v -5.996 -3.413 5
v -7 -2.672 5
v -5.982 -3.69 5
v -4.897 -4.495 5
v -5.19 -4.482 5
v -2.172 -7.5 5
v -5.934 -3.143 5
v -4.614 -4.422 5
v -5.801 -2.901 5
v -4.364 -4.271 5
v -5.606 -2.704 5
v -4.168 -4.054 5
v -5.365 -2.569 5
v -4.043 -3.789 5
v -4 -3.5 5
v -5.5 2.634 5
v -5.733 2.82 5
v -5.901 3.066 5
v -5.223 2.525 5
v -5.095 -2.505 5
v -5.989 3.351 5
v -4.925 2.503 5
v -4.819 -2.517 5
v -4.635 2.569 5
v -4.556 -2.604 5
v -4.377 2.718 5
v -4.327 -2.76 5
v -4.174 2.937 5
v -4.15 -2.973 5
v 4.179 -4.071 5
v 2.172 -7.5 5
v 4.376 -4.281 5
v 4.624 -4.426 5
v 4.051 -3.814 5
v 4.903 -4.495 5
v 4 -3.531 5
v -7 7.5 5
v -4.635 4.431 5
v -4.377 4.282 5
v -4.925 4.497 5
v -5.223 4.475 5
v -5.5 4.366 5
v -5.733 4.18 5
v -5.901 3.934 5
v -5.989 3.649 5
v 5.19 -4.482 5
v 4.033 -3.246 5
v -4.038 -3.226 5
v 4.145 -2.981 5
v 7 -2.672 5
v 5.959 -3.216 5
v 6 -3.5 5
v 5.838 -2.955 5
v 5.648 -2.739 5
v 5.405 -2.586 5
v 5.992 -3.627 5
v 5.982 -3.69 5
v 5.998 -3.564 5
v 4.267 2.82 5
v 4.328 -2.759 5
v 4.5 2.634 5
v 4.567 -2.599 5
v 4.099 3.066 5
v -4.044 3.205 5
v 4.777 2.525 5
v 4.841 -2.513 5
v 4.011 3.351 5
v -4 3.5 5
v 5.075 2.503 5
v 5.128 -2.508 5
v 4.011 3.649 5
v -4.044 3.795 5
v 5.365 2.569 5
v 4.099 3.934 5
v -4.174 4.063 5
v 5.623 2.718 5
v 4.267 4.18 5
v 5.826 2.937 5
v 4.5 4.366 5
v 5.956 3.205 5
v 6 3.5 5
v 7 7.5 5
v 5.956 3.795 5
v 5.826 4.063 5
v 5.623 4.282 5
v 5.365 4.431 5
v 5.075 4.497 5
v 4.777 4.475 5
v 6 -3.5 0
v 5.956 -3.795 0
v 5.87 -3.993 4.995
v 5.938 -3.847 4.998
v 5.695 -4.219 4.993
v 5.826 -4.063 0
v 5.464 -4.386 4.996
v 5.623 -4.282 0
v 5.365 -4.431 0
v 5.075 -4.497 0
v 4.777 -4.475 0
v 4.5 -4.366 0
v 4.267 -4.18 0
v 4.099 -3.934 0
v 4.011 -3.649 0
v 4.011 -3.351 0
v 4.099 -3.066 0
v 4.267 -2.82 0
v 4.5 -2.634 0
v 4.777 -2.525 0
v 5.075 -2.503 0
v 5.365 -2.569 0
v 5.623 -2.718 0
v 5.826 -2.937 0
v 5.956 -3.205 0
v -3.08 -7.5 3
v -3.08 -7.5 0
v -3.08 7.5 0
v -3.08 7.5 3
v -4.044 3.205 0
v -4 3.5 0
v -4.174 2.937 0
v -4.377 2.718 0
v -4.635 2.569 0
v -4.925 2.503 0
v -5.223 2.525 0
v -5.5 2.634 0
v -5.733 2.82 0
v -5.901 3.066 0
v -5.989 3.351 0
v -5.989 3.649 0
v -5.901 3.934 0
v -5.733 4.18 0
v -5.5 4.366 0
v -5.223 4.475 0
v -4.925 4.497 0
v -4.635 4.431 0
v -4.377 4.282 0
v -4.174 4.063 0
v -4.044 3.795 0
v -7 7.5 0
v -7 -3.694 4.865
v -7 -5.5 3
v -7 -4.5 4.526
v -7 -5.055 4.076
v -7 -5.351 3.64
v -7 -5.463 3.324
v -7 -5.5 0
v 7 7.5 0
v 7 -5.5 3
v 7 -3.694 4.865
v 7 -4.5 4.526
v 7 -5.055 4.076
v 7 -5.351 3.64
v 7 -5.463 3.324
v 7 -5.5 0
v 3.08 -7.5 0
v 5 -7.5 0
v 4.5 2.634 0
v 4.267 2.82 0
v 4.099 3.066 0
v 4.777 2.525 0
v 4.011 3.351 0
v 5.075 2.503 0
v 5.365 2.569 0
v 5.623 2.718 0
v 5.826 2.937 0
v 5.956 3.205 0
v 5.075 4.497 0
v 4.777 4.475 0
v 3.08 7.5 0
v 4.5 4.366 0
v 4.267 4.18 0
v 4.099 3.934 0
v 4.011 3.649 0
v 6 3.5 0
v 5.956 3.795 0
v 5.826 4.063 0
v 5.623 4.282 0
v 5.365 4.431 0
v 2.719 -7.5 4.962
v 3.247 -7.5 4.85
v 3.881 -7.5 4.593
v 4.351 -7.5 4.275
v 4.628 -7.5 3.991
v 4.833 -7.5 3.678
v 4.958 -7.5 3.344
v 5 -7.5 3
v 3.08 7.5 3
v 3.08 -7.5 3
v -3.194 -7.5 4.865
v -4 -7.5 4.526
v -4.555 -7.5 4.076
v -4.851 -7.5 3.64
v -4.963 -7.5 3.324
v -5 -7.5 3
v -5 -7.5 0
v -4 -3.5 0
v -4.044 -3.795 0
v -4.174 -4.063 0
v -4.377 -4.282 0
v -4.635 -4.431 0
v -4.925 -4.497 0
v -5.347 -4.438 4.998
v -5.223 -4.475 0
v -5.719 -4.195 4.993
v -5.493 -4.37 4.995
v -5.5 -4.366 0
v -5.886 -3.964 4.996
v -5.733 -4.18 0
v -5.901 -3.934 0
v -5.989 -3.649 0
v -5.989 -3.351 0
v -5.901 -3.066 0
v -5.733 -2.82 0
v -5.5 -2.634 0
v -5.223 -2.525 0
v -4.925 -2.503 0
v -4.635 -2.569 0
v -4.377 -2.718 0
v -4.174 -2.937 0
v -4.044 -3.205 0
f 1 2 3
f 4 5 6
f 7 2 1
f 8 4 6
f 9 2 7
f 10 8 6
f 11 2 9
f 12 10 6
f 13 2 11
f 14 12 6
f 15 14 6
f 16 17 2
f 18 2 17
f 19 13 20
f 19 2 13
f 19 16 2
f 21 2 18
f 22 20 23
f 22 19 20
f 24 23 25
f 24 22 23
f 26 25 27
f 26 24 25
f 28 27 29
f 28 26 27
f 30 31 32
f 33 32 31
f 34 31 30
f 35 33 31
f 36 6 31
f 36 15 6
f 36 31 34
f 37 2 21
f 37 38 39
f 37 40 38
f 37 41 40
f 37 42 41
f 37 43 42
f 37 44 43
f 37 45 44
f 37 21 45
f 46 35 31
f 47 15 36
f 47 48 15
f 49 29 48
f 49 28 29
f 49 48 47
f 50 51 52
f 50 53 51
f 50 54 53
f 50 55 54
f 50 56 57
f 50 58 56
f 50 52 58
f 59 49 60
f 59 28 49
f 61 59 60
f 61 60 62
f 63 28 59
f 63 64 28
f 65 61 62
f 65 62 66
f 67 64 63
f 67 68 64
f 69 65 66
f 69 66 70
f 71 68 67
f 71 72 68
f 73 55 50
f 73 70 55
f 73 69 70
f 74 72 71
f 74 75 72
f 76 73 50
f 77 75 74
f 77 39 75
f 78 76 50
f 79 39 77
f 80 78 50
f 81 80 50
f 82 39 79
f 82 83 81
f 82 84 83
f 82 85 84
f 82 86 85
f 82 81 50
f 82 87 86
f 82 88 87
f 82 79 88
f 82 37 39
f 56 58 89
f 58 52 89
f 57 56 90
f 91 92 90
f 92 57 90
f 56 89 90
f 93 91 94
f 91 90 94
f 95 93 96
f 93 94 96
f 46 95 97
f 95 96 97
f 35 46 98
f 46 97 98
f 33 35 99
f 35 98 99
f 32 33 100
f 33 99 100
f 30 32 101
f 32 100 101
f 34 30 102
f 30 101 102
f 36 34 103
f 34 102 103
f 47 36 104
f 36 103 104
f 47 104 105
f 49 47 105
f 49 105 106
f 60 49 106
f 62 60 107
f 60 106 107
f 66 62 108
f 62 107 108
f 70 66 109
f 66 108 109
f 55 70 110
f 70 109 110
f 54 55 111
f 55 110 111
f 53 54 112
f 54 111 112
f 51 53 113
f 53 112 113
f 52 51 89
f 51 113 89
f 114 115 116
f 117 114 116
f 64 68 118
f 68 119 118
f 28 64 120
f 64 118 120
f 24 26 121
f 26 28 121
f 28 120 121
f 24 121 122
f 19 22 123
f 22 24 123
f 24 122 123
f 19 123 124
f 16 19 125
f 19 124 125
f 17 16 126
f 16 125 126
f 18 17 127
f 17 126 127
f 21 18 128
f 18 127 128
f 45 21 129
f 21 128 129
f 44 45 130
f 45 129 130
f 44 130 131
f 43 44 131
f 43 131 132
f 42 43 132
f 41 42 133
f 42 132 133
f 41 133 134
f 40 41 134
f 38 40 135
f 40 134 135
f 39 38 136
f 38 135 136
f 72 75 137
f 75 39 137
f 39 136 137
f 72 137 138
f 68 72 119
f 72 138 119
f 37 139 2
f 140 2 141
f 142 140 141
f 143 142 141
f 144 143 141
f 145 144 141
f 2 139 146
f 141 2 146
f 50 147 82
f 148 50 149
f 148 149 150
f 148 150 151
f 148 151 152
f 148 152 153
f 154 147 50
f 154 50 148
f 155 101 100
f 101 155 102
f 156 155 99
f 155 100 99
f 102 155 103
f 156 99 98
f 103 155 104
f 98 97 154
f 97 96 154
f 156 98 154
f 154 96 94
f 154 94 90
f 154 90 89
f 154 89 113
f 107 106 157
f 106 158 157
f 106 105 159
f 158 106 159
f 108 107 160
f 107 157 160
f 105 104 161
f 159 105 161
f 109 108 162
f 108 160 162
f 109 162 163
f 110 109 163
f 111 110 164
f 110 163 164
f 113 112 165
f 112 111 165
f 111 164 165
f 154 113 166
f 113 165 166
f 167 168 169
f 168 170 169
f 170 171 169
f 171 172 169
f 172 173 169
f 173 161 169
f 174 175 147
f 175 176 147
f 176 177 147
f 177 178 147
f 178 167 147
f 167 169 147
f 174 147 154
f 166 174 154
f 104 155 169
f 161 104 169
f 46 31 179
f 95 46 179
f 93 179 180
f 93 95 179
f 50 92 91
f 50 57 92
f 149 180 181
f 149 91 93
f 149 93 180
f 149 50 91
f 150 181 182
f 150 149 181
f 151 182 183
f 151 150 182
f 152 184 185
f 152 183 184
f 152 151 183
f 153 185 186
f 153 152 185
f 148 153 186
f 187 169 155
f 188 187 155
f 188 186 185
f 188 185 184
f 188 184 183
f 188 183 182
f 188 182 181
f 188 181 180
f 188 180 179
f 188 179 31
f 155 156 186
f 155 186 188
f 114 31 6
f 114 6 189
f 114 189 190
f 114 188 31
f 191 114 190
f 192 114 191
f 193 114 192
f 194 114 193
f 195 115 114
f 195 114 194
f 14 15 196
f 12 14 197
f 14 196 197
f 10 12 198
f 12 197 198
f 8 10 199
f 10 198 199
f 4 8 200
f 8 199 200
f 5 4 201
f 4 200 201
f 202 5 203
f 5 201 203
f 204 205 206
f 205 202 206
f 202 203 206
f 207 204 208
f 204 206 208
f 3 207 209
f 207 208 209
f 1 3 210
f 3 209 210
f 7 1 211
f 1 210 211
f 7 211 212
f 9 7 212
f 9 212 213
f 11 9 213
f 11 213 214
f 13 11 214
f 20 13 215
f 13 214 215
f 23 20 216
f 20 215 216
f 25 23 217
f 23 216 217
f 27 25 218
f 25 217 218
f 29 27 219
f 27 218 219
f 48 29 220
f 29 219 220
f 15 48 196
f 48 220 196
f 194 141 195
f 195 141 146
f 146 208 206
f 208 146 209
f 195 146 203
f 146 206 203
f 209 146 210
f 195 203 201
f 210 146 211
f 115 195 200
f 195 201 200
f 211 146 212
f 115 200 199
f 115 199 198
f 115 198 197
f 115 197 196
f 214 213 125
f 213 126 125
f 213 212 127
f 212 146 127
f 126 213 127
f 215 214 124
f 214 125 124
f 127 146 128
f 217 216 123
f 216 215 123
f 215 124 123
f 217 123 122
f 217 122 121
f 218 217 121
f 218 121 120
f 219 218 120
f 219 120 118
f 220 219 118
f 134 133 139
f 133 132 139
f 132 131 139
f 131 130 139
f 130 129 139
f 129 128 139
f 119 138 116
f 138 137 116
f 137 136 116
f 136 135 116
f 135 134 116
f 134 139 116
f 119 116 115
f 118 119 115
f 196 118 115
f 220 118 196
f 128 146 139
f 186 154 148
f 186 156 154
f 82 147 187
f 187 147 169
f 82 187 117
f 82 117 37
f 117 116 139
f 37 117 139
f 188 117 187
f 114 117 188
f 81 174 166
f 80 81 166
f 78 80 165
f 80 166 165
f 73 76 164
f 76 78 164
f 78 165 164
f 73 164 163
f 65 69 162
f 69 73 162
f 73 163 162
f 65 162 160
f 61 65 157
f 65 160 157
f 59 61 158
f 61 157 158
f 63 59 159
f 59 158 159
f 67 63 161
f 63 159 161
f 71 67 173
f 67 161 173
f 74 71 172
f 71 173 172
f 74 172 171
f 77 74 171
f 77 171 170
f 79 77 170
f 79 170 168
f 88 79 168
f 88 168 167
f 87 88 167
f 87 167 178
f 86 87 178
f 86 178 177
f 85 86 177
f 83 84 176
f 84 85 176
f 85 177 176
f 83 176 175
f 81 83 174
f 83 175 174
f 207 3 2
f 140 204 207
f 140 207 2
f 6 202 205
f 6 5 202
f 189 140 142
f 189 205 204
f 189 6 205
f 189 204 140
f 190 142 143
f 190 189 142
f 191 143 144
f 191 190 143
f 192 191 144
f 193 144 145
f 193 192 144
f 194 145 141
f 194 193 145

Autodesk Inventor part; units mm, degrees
ref_plane "YZ Plane" through (0, 0, 0) normal (1, 0, 0) x (0, 1, 0)
ref_plane "XZ Plane" through (0, 0, 0) normal (0, 1, 0) x (-1, 0, 0)
ref_plane "XY Plane" through (0, 0, 0) normal (0, 0, 1) x (1, 0, 0)
sketch "Sketch1" plane through (0, 0, 0) normal (0, 0, 1) x (1, 0, 0)
  line L0 (7, 7.5) -> (3, 7.5) projected
  line L1 (3, 7.5) -> (3, -7.5) projected
  line L2 (7, -7.5) -> (3, -7.5) projected
  line L3 (7, 7.5) -> (7, -7.5) projected
  circle A0 centre (5, -3.5) radius 1 projected
  circle A1 centre (5, 3.5) radius 1 projected
  line L4 (-3, 7.5) -> (-7, 7.5) projected
  line L5 (-7, -7.5) -> (-7, 7.5) projected
  line L6 (-3, -7.5) -> (-7, -7.5) projected
  line L7 (-3, -7.5) -> (-3, 7.5) projected
  circle A2 centre (-5, 3.5) radius 1 projected
  circle A3 centre (-5, -3.5) radius 1 projected
  point P0 (0, 0)
extrude "Extrusion1" add sketch "Sketch1" along normal blind 3
sketch "Sketch2" plane through (0, 0, 3) normal (0, 0, 1) x (1, 0, 0)
  line L0 (7, -7.5) -> (7, 7.5) projected
  line L1 (7, 7.5) -> (3, 7.5) projected
  line L2 (3, 7.5) -> (3, -7.5) projected
  line L3 (3, -7.5) -> (7, -7.5) projected
  circle A0 centre (5, -3.5) radius 1 projected
  circle A1 centre (5, 3.5) radius 1 projected
  line L4 (-3, -7.5) -> (-3, 7.5) projected
  line L5 (-3, 7.5) -> (-7, 7.5) projected
  line L6 (-7, 7.5) -> (-7, -7.5) projected
  line L7 (-7, -7.5) -> (-3, -7.5) projected
  circle A2 centre (-5, 3.5) radius 1 projected
  circle A3 centre (-5, -3.5) radius 1 projected
  line L8 (7, -7.5) -> (-7, -7.5)
  line L9 (-7, -7.5) -> (-7, 7.5)
  line L10 (-7, 7.5) -> (7, 7.5)
  line L11 (7, 7.5) -> (7, -7.5)
  point P0 (0, 0)
extrude "Extrusion2" add sketch "Sketch2" along normal blind 2
chamfer "Chamfer1" distance 2 angle 45 2 edges at (7, -7.5, 2.5) (-7, -7.5, 2.5)
fillet "Fillet1" radius 2 2 edges at (6, -6.5, 5) (-6, -6.5, 5)
thicken "Thicken1" operation add thickness 0.08 both sides no extend neighbours yes toward (-1, 0, 0) faces at (-3, -2.5, 1)
thicken "Thicken2" operation add thickness 0.08 both sides no extend neighbours yes toward (1, 0, 0) faces at (3, 2.5, 1)
properties part number "sub_arm_2_mod"
